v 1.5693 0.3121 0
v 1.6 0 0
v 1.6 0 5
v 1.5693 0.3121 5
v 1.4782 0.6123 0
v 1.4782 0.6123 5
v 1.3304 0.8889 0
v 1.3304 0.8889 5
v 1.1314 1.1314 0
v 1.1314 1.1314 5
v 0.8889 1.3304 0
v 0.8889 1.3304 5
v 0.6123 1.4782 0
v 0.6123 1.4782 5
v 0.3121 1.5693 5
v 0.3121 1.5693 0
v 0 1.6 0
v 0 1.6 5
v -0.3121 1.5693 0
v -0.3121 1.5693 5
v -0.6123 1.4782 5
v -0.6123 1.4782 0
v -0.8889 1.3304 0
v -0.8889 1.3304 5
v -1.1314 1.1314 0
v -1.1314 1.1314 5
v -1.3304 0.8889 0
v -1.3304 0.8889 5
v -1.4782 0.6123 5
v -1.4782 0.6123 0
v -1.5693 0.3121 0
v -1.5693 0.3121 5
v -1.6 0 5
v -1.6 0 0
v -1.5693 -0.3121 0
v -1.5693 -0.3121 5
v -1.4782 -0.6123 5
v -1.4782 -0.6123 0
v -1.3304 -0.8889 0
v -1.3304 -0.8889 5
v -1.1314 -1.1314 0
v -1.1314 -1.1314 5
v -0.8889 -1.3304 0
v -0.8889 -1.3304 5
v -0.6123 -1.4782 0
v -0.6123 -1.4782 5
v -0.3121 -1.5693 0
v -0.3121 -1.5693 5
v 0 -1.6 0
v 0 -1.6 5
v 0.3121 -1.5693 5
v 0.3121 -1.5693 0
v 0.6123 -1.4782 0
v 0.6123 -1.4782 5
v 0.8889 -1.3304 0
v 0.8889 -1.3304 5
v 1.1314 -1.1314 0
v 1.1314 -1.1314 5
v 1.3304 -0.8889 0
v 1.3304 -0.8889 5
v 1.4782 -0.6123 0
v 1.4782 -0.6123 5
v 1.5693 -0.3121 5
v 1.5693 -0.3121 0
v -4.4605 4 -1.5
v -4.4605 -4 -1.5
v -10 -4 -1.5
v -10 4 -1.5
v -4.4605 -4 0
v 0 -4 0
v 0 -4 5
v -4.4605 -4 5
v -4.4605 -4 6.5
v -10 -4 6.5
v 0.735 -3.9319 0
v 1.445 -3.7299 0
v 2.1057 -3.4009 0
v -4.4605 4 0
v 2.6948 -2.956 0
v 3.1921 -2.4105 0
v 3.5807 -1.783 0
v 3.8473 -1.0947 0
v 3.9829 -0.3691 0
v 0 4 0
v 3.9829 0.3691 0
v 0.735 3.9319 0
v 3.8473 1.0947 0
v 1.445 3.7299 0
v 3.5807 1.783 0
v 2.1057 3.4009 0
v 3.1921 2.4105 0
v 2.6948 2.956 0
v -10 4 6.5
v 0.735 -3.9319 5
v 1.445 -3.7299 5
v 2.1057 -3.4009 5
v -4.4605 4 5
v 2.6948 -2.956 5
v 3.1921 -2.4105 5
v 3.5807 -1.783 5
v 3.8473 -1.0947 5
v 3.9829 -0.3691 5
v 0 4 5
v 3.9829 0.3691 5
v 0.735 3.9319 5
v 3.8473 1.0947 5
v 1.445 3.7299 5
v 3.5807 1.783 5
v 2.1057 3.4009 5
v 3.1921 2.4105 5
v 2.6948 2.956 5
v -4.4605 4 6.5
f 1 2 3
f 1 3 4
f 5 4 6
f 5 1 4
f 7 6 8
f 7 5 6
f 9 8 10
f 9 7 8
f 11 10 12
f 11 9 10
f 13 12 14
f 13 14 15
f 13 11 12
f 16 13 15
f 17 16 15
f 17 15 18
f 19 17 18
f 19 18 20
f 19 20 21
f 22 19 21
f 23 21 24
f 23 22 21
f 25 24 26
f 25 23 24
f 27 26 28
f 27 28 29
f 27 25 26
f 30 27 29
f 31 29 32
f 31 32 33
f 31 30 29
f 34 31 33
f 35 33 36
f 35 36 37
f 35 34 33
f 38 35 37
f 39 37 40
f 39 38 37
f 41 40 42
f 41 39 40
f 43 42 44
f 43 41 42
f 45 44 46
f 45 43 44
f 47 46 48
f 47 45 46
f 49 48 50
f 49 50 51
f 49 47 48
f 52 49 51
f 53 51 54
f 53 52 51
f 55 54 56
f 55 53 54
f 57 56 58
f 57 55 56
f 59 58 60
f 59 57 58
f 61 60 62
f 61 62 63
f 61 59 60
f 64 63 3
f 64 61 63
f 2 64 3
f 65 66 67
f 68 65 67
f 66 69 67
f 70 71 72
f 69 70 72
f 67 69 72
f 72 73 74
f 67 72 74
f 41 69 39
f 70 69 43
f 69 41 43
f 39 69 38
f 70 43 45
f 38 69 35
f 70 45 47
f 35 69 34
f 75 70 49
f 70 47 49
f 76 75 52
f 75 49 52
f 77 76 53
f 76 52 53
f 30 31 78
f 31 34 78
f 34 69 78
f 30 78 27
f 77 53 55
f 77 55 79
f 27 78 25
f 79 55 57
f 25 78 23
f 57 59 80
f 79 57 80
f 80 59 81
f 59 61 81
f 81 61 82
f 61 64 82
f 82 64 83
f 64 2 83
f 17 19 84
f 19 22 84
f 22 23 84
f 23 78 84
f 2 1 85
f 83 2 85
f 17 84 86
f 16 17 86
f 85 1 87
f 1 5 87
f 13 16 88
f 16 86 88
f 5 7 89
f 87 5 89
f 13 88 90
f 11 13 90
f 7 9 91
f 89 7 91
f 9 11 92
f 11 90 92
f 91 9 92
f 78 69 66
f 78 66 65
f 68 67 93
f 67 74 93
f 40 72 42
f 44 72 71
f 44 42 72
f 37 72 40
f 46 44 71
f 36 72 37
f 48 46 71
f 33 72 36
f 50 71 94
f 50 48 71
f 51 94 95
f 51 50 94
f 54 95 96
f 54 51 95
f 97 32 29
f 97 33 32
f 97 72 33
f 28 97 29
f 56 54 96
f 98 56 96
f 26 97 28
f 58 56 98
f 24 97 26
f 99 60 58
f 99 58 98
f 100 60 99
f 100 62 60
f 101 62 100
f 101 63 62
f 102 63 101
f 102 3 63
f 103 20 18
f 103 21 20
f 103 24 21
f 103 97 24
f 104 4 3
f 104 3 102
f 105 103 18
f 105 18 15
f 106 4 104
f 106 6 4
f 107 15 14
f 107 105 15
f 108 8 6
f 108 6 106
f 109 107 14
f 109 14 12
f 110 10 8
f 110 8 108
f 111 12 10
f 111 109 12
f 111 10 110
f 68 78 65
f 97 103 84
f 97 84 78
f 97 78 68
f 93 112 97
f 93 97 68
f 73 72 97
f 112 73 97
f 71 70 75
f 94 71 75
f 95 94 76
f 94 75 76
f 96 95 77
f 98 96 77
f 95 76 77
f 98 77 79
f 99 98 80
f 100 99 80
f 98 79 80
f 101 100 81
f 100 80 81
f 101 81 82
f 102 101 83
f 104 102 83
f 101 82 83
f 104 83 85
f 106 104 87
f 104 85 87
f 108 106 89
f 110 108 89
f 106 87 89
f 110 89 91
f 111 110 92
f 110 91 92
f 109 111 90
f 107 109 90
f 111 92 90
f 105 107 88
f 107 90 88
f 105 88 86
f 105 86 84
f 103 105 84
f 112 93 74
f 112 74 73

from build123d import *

# Parameters (mm, degrees)
SKETCH1_R           = 1.6
BOSS_EXTRUDE2_DEPTH = 5
SKETCH2_W           = 5.53954597
SKETCH2_H           = 8
BOSS_EXTRUDE3_DEPTH = 1.5
SKETCH3_W           = 5.53954597
SKETCH3_H           = 8
BOSS_EXTRUDE4_DEPTH = 1.5


with BuildPart() as part:
    # Sketch1 → Boss-Extrude2 (new body)
    with BuildSketch(Plane.XY):
        with BuildLine():
            Line((0, 4), (-10, 4))
            Line((-10, 4), (-10, -4))
            Line((-10, -4), (0, -4))
            ThreePointArc((0, -4), (4, 0), (0, 4))
        make_face()
        Circle(SKETCH1_R, mode=Mode.SUBTRACT)
    extrude(amount=BOSS_EXTRUDE2_DEPTH)

    # Sketch2 → Boss-Extrude3 (add)
    with BuildSketch(Plane.XY.offset(5)):
        with Locations((-7.230227015, 0)):
            Rectangle(SKETCH2_W, SKETCH2_H)
    extrude(amount=BOSS_EXTRUDE3_DEPTH)

    # Sketch3 → Boss-Extrude4 (add)
    with BuildSketch(Plane(origin=(0, 0, 0), x_dir=(-1, 0, 0), z_dir=(0, 0, -1))):
        with Locations((7.230227015, 0)):
            Rectangle(SKETCH3_W, SKETCH3_H)
    extrude(amount=BOSS_EXTRUDE4_DEPTH)


solid = part.part
